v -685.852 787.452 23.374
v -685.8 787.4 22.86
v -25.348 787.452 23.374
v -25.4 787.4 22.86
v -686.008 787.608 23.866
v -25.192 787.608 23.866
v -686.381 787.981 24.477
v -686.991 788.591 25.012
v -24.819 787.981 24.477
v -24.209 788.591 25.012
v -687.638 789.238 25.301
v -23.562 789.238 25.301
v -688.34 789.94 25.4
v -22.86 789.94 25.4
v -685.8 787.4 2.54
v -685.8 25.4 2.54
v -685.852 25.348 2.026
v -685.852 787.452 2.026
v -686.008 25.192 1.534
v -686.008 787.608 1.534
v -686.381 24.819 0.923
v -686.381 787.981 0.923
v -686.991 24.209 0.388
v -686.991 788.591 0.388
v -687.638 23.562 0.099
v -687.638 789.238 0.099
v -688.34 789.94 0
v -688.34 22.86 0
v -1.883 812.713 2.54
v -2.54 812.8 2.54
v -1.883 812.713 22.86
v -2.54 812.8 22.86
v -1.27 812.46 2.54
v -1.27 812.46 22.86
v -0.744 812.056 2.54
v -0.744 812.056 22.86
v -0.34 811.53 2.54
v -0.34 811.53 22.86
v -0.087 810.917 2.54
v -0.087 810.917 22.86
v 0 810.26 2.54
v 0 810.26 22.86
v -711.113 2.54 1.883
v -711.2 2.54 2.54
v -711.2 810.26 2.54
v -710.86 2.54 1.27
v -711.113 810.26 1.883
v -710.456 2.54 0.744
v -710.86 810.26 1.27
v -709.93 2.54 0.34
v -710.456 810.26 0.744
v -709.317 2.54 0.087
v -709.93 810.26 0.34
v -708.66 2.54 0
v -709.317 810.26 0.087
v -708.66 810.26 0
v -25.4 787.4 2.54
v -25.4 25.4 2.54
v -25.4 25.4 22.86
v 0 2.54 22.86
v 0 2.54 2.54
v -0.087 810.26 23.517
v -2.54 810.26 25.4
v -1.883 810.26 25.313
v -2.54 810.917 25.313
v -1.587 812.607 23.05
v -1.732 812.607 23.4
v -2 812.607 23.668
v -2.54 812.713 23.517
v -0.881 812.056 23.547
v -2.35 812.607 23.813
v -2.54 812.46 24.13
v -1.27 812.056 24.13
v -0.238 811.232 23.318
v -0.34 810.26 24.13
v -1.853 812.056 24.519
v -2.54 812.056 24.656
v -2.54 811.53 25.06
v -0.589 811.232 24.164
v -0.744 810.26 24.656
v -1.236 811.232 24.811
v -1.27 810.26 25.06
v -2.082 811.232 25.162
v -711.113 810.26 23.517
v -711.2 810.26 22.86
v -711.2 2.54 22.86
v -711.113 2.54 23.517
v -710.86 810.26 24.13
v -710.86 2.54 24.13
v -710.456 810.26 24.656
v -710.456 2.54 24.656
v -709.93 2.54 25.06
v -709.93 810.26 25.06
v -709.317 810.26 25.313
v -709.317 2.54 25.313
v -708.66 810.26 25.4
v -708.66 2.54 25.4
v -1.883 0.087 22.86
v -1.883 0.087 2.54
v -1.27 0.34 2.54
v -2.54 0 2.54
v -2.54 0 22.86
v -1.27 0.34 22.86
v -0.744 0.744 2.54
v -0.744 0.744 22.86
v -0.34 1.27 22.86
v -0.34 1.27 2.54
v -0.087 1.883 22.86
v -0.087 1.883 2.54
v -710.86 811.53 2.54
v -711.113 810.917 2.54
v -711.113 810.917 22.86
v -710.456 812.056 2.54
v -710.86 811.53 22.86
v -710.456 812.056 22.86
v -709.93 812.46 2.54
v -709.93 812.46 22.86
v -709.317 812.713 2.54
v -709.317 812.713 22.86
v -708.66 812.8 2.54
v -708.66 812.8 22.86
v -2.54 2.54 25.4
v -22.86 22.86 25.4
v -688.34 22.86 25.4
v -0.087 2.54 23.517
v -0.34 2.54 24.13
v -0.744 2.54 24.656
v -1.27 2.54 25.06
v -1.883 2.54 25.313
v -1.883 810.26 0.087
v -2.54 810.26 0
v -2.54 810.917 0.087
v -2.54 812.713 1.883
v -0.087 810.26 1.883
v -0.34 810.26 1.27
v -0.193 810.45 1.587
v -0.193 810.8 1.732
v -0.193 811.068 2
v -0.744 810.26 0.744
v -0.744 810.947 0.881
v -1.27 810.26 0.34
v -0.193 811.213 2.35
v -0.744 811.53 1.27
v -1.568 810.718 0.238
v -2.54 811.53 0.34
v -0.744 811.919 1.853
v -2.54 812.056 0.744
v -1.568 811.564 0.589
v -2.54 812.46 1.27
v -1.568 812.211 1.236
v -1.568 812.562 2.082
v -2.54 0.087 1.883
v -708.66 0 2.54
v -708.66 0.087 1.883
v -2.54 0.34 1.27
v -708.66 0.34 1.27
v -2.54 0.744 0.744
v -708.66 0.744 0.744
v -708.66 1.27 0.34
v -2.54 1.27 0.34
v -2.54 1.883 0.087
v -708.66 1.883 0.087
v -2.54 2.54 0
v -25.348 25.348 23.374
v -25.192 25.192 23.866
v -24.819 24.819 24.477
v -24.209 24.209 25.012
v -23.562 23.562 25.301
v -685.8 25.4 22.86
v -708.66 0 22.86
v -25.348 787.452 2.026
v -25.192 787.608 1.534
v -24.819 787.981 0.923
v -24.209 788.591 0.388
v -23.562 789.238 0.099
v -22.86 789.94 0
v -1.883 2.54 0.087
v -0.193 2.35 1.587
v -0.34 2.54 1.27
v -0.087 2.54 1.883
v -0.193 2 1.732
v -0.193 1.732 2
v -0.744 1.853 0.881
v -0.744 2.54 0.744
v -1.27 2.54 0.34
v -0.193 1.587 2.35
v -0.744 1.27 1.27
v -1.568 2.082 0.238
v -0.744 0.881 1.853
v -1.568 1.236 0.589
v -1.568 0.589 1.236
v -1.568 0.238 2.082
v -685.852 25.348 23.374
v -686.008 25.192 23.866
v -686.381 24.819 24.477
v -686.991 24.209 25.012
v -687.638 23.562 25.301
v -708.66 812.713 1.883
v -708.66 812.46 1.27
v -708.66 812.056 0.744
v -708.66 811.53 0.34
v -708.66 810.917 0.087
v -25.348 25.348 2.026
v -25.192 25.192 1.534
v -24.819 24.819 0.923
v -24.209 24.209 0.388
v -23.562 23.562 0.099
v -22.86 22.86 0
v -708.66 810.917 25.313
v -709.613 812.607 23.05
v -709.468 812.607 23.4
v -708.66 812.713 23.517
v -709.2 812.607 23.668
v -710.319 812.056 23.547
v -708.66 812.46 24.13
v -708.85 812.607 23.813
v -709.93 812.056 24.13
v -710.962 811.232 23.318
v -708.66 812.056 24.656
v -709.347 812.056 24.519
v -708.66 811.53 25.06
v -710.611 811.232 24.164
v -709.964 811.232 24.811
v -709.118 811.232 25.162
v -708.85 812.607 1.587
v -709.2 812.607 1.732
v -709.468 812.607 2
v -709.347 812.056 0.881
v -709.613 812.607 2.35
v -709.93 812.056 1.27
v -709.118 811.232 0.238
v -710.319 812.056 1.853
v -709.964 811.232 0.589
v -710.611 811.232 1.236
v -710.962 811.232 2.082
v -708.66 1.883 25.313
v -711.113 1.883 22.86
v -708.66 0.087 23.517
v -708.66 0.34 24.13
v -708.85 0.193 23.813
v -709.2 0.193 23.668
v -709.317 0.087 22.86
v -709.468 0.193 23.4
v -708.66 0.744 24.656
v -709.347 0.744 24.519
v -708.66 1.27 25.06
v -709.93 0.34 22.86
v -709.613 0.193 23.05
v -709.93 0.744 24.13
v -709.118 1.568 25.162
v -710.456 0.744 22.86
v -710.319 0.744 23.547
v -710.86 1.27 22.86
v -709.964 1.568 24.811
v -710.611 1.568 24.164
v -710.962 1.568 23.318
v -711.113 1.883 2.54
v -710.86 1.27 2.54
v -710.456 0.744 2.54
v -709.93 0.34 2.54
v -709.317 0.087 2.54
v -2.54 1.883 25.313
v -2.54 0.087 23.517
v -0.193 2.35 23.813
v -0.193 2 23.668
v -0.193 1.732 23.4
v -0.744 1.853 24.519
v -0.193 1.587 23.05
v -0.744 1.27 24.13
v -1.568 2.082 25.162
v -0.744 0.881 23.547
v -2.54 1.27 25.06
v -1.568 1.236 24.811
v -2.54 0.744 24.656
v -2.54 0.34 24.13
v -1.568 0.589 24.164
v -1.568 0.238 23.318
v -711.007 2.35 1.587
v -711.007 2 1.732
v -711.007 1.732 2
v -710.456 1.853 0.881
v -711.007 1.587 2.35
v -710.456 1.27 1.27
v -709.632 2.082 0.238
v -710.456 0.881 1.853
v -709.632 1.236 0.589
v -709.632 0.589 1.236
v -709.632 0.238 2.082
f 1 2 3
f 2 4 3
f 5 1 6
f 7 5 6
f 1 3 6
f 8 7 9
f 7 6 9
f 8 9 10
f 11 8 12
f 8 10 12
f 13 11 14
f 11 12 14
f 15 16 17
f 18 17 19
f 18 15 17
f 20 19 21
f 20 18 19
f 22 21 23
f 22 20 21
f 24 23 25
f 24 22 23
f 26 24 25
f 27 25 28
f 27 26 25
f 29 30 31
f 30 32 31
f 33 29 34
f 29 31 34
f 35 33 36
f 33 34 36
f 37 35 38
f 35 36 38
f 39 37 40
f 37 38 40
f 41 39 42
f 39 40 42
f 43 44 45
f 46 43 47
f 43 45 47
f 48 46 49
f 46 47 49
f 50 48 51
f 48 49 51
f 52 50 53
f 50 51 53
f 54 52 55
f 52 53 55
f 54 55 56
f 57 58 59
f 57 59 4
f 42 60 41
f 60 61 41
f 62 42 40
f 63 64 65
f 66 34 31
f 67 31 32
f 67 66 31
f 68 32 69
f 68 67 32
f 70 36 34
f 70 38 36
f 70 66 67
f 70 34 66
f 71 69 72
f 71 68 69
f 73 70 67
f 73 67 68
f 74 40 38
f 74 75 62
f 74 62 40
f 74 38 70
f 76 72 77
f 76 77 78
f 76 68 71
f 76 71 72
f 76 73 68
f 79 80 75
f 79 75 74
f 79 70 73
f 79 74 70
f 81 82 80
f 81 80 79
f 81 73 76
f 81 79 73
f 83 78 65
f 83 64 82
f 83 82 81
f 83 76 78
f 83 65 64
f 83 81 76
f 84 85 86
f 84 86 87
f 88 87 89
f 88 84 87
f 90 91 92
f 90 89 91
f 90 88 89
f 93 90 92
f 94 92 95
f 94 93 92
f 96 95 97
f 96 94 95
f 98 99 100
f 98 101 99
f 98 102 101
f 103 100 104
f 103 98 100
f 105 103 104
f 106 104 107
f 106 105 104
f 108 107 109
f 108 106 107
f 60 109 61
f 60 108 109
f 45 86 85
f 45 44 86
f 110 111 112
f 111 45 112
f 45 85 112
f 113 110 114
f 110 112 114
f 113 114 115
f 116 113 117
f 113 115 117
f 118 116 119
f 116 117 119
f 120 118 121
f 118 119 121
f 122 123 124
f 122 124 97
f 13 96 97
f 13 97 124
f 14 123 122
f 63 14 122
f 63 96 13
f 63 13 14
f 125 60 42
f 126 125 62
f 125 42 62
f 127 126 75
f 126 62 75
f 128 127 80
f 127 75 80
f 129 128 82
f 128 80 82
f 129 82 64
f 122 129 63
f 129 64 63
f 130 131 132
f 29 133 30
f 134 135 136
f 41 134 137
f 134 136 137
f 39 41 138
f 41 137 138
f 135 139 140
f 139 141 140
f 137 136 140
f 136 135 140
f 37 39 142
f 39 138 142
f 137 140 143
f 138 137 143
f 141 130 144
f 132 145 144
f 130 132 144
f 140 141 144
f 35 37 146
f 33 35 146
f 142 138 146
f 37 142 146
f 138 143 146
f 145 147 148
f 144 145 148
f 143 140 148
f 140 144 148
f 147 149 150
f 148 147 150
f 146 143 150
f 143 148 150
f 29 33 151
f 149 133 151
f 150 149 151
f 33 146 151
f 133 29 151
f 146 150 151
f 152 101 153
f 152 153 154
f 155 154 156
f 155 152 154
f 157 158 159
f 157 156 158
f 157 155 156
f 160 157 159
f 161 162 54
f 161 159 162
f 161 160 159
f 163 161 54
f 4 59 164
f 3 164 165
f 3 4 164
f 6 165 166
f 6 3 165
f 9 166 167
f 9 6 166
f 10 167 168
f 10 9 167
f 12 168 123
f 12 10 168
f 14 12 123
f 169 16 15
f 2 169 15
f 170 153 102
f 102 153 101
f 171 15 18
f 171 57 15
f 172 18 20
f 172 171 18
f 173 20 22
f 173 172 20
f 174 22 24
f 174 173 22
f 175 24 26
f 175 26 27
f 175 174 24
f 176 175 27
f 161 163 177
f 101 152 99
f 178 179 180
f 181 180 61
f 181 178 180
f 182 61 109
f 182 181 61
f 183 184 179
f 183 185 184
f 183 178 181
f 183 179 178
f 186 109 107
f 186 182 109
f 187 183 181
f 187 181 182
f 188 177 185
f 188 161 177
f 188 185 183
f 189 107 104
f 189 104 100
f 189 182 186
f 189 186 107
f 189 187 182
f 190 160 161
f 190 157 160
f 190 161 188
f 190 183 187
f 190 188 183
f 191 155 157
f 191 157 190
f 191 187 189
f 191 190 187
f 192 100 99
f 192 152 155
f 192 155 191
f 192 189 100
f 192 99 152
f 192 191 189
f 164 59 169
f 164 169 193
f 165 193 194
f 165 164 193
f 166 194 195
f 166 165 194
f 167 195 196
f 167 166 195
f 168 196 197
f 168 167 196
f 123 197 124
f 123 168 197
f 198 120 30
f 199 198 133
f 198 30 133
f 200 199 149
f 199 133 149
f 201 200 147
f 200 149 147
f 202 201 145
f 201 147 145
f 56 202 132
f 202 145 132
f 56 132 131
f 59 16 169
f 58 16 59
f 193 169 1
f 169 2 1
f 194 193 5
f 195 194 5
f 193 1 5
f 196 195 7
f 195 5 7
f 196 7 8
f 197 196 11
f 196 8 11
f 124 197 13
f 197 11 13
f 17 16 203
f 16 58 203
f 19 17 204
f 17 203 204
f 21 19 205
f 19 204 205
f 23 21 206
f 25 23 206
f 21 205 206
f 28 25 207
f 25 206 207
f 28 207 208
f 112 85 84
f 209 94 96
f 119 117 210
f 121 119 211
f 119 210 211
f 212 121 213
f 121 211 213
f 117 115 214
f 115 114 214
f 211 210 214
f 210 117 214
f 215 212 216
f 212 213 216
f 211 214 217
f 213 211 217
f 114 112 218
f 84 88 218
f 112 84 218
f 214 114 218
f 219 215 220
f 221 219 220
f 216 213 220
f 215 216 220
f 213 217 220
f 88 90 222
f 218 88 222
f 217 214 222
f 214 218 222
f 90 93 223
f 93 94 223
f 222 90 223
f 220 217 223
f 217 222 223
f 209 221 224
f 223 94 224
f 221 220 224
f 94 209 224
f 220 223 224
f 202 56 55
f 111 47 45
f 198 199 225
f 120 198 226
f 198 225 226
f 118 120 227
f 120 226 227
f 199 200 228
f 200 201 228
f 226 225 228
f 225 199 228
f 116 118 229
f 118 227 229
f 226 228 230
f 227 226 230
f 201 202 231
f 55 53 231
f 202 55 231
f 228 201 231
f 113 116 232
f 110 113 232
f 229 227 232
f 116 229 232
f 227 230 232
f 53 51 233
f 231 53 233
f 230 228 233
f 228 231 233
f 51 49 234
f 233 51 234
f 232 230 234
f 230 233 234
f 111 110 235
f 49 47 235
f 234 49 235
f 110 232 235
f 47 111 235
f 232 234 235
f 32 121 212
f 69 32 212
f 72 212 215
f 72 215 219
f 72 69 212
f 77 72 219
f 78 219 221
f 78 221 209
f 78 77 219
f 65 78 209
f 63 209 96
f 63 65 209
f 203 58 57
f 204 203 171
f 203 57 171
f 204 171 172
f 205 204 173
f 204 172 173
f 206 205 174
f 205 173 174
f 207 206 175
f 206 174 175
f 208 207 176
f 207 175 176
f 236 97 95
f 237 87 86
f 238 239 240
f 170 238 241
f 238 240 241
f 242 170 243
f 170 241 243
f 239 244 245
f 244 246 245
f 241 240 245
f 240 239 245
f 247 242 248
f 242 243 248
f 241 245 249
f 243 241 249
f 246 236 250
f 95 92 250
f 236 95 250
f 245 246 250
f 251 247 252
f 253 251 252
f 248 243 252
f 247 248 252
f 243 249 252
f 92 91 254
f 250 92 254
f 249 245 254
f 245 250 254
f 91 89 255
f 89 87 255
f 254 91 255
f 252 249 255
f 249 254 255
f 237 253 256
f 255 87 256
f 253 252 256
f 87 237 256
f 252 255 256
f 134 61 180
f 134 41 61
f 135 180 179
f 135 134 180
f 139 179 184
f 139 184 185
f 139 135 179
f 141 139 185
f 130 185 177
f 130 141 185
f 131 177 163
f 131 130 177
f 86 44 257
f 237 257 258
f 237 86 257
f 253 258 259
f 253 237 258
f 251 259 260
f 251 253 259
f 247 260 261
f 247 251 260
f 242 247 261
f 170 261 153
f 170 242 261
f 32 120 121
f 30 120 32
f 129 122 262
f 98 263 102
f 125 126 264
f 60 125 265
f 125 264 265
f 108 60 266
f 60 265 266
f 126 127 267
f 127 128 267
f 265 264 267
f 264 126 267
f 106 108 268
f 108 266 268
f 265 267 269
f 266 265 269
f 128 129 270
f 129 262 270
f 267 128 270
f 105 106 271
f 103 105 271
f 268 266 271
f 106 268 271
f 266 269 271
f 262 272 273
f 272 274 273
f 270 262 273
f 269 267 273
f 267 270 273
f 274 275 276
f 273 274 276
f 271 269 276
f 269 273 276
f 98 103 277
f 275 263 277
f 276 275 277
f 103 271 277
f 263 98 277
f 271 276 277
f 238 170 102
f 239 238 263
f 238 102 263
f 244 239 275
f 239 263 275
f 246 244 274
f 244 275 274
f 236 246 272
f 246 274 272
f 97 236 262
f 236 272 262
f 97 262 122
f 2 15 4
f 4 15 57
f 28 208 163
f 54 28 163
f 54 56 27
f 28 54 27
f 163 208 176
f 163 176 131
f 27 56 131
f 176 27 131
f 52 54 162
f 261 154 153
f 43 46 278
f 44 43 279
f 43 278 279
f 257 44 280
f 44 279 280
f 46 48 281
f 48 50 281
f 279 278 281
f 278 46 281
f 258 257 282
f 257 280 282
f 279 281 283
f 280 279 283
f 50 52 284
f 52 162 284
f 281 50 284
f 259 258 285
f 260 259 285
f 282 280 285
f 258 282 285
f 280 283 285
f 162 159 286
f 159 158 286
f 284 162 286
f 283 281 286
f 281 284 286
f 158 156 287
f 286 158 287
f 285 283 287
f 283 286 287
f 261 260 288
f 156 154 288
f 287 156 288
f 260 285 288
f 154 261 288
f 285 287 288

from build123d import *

# Parameters (mm, degrees)
SKETCH1_W           = 711.2
SKETCH1_H           = 812.8
SKETCH1_W_2         = 660.4
SKETCH1_H_2         = 762
BOSS_EXTRUDE1_DEPTH = 25.4
FILLET1_R           = 2.54


with BuildPart() as part:
    # Sketch1 → Boss-Extrude1 (new body)
    with BuildSketch(Plane.XY):
        with Locations((-355.6, 406.4)):
            Rectangle(SKETCH1_W, SKETCH1_H)
        with Locations((-355.6, 406.4)):
            Rectangle(SKETCH1_W_2, SKETCH1_H_2, mode=Mode.SUBTRACT)
    extrude(amount=BOSS_EXTRUDE1_DEPTH)

    # Fillet1
    fillet1_edges = [part.edges().sort_by_distance(p)[0] for p in [
        (-711.2, 406.4, 25.4),
        (-25.4, 406.4, 0),
        (-355.6, 787.4, 0),
        (-685.8, 406.4, 0),
        (-355.6, 25.4, 0),
        (-25.4, 406.4, 25.4),
        (-355.6, 0, 25.4),
        (-355.6, 787.4, 25.4),
        (-685.8, 406.4, 25.4),
        (-355.6, 25.4, 25.4),
        (0, 406.4, 25.4),
        (-355.6, 0, 0),
        (-711.2, 406.4, 0),
        (-355.6, 812.8, 0),
        (0, 406.4, 0),
        (0, 0, 12.7),
        (-711.2, 0, 12.7),
        (-711.2, 812.8, 12.7),
        (0, 812.8, 12.7),
        (-355.6, 812.8, 25.4),
    ]]
    fillet(fillet1_edges, radius=FILLET1_R)


solid = part.part
